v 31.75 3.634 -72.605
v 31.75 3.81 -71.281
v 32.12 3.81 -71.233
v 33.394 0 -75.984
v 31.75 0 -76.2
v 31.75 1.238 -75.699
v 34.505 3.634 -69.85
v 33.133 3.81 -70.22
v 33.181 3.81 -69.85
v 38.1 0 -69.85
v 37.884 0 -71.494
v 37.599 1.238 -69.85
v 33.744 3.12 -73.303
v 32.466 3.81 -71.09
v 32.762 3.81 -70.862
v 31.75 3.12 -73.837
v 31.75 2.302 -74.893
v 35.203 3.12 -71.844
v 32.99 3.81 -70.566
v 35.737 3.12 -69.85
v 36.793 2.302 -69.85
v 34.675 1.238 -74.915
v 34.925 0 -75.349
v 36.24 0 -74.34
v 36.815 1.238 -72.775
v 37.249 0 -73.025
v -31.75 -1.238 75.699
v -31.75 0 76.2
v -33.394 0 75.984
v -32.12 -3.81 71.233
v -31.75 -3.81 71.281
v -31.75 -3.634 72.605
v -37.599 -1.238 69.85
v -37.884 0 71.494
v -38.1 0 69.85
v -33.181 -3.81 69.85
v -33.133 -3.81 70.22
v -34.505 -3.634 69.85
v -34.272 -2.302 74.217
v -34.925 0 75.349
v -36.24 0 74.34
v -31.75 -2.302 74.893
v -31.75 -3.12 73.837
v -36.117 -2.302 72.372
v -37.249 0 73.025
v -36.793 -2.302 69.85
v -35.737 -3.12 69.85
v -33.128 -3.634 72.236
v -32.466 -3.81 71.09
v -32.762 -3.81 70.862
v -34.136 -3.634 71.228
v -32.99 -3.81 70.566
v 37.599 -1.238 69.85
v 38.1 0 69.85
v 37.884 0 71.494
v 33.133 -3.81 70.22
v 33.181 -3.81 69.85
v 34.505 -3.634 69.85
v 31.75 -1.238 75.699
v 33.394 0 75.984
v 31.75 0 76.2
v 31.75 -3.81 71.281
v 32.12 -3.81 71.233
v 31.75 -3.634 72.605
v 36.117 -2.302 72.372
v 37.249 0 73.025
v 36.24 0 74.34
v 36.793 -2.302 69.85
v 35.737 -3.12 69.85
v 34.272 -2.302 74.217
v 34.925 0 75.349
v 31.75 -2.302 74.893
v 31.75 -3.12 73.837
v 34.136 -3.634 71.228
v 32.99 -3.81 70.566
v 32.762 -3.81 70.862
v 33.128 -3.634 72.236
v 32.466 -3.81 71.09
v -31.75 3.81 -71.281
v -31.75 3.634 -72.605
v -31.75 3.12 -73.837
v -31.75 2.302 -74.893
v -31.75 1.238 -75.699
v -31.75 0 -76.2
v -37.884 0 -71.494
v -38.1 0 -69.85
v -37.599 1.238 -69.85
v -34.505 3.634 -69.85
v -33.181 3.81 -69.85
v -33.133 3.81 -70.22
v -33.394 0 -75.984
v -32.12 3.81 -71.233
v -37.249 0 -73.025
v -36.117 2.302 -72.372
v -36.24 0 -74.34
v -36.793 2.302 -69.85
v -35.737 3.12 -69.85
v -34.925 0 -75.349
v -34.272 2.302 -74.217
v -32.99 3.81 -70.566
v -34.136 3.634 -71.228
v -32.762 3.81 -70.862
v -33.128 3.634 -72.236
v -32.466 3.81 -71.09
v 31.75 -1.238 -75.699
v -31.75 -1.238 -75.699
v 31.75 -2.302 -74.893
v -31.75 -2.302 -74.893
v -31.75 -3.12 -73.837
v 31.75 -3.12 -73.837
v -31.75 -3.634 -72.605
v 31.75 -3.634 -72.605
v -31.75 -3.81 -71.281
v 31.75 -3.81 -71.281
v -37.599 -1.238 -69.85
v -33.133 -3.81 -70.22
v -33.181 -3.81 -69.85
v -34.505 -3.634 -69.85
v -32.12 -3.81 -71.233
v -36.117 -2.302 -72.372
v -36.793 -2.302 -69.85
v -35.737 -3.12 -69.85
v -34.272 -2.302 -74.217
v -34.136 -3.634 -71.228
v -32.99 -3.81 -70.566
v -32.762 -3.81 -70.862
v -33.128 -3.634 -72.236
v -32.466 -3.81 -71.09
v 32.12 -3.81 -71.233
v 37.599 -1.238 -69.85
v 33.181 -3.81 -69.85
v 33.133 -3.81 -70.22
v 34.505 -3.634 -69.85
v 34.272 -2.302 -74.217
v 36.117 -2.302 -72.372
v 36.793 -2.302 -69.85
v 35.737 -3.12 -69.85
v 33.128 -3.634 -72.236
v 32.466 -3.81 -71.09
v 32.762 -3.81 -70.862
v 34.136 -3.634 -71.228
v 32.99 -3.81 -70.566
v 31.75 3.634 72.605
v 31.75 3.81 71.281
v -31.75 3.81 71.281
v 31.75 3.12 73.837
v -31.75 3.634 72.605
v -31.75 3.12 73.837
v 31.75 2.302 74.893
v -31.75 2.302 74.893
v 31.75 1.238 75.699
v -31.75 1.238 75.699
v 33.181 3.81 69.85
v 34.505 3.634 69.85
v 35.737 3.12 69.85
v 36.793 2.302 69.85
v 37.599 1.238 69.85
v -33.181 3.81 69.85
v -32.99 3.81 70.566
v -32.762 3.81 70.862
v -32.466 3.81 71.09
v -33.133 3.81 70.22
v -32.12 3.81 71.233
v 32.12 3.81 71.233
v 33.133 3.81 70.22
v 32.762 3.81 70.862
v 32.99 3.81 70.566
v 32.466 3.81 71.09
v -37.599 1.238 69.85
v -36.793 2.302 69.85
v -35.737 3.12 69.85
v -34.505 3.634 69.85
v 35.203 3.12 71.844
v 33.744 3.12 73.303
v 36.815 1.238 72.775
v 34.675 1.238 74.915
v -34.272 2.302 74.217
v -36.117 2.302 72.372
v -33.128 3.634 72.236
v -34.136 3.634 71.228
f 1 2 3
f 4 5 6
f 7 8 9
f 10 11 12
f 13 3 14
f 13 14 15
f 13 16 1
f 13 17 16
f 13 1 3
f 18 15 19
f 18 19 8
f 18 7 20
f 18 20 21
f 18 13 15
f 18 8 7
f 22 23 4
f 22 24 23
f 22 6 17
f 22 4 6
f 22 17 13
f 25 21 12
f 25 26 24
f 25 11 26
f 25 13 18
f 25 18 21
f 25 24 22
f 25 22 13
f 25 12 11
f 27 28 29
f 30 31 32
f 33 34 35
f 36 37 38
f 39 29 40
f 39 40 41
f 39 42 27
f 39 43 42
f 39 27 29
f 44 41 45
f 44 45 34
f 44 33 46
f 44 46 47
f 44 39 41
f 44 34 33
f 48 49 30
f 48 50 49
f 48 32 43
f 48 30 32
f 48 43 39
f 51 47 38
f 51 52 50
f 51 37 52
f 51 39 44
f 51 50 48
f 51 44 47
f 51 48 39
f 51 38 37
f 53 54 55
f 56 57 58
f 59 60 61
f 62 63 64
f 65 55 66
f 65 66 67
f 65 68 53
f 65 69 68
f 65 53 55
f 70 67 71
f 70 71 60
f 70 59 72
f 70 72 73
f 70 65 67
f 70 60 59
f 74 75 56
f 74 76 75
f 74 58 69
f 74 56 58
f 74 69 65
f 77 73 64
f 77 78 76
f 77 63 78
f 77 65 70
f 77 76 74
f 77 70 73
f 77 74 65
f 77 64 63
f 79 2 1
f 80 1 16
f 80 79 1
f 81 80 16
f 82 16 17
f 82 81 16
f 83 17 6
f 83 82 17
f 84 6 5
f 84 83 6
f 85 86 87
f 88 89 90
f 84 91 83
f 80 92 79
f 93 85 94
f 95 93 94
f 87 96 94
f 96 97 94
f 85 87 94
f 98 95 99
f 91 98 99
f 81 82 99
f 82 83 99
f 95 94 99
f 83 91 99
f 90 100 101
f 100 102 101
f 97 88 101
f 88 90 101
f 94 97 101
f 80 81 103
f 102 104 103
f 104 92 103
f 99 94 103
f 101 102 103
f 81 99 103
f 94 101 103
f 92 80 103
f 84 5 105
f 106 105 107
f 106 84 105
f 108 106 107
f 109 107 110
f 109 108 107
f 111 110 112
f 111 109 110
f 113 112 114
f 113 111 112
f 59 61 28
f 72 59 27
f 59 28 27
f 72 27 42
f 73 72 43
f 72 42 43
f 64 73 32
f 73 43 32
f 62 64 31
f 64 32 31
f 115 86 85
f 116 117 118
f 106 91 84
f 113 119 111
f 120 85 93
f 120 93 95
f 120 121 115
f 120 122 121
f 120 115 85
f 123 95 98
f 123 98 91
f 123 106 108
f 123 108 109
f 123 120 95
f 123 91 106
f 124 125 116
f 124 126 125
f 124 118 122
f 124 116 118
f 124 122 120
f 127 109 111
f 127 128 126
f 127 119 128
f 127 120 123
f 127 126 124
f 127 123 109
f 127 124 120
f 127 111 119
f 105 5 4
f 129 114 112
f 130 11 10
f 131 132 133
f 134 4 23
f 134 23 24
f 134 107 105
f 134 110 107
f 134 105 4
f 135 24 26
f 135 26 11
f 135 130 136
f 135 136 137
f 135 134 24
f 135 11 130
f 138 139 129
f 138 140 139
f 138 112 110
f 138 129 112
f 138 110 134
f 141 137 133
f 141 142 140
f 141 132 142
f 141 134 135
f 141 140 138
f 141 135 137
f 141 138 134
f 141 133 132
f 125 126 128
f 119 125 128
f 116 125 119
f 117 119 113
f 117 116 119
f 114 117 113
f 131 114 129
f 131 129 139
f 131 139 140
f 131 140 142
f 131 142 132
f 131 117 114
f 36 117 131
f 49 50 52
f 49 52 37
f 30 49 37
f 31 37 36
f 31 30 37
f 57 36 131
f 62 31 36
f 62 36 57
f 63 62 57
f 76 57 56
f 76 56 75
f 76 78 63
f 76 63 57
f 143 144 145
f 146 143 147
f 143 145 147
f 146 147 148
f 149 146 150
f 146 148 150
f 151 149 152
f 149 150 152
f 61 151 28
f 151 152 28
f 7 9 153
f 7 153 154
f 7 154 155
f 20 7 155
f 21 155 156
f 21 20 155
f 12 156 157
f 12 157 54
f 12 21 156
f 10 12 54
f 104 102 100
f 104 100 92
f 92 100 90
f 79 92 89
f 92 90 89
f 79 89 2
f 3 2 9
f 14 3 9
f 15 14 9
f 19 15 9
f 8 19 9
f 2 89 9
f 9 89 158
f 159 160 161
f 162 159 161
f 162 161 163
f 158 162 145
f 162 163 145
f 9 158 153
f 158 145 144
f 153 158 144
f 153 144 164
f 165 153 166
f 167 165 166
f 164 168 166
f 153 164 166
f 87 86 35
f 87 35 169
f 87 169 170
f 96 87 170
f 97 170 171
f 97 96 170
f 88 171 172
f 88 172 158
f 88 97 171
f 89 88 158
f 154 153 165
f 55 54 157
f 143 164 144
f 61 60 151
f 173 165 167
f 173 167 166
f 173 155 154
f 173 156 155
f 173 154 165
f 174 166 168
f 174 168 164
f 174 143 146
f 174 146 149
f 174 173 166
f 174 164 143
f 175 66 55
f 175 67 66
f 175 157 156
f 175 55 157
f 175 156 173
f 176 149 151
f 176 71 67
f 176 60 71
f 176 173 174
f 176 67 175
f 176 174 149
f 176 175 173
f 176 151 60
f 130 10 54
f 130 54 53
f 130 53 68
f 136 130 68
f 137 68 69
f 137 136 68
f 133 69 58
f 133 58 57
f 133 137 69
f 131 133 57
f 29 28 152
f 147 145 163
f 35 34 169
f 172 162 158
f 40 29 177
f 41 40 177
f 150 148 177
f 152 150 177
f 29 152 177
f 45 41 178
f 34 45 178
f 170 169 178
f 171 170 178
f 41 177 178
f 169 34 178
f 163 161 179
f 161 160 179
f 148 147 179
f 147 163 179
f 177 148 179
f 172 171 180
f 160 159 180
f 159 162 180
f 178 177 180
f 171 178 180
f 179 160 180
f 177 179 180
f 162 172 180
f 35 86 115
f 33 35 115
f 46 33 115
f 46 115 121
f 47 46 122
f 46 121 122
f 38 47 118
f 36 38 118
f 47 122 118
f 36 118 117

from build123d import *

# Parameters (mm, degrees)
F1_DEPTH     = 3.81
F2_T1_DEPTH  = 139.7
F2_T3_DEPTH  = 63.5
F2_T6_ANGLE  = 90
F2_T8_ANGLE  = 90
F2_T10_ANGLE = 90
F2_T12_ANGLE = 90
F3_DEPTH     = 3.81
F4_T1_DEPTH  = 139.7
F4_T3_DEPTH  = 63.5
F4_T6_ANGLE  = 90
F4_T8_ANGLE  = 90
F4_T10_ANGLE = 90
F4_T12_ANGLE = 90


# Not quite as in the source:
# - a fillet or chamfer that OpenCascade refuses, or shapes differently, is made with other operations: its cross-section is extruded or revolved along the edge and cut away or added
# - the program builds the solid bodies; features that only make, move or delete a surface that nothing else refers to are left out


with BuildPart() as f1:
    # F0 (on Front) → F1 (new body)
    with BuildSketch(Plane.XZ):
        with BuildLine():
            Line((-31.75, -76.2), (31.75, -76.2))
            ThreePointArc((31.75, -76.2), (36.2401280605, -74.3401280605), (38.1, -69.85))
            Line((38.1, -69.85), (38.1, 69.85))
            ThreePointArc((38.1, 69.85), (36.2401280605, 74.3401280605), (31.75, 76.2))
            Line((31.75, 76.2), (-31.75, 76.2))
            ThreePointArc((-31.75, 76.2), (-36.2401280605, 74.3401280605), (-38.1, 69.85))
            Line((-38.1, 69.85), (-38.1, -69.85))
            ThreePointArc((-38.1, -69.85), (-36.2401280605, -74.3401280605), (-31.75, -76.2))
        make_face()
    extrude(amount=F1_DEPTH)

    # F2: fillet of radius 5.08 on 1 edges, made by hand

    # F2_s2 → F2_t1 (cut)
    with BuildSketch(Plane.XY.offset(-69.85)):
        with BuildLine():
            ThreePointArc((38.1, 0), (36.2921631237, -2.7460926284), (33.1813111503, -3.81))
            Line((33.1813111503, -3.81), (38.1, -3.81))
            Line((38.1, -3.81), (38.1, 0))
        make_face()
        with BuildLine():
            ThreePointArc((-38.1, 0), (-36.2921631237, -2.7460926284), (-33.1813111503, -3.81))
            Line((-33.1813111503, -3.81), (-38.1, -3.81))
            Line((-38.1, -3.81), (-38.1, 0))
        make_face()
    extrude(amount=F2_T1_DEPTH, mode=Mode.SUBTRACT)

    # F2_s4 → F2_t3 (cut)
    with BuildSketch(Plane.YZ.offset(-31.75)):
        with BuildLine():
            ThreePointArc((0, 76.2), (-2.7460926284, 74.3921631237), (-3.81, 71.2813111503))
            Line((-3.81, 71.2813111503), (-3.81, 76.2))
            Line((-3.81, 76.2), (0, 76.2))
        make_face()
        with BuildLine():
            ThreePointArc((0, -76.2), (-2.7460926284, -74.3921631237), (-3.81, -71.2813111503))
            Line((-3.81, -71.2813111503), (-3.81, -76.2))
            Line((-3.81, -76.2), (0, -76.2))
        make_face()
    extrude(amount=F2_T3_DEPTH, mode=Mode.SUBTRACT)

    # F2_s5 → F2_t6 (revolve, cut)
    with BuildSketch(Plane.YZ.offset(31.75)):
        with BuildLine():
            ThreePointArc((0, -76.2), (-2.7460926284, -74.3921631237), (-3.81, -71.2813111503))
            Line((-3.81, -71.2813111503), (-3.81, -76.2))
            Line((-3.81, -76.2), (0, -76.2))
        make_face()
    revolve(axis=Axis((31.75, -3.81, -69.85), (0, -1, 0)), revolution_arc=F2_T6_ANGLE, mode=Mode.SUBTRACT)

    # F2_s7 → F2_t8 (revolve, cut)
    with BuildSketch(Plane.XY.offset(69.85)):
        with BuildLine():
            ThreePointArc((38.1, 0), (36.2921631237, -2.7460926284), (33.1813111503, -3.81))
            Line((33.1813111503, -3.81), (38.1, -3.81))
            Line((38.1, -3.81), (38.1, 0))
        make_face()
    revolve(axis=Axis((31.75, -3.81, 69.85), (0, -1, 0)), revolution_arc=F2_T8_ANGLE, mode=Mode.SUBTRACT)

    # F2_s9 → F2_t10 (revolve, cut)
    with BuildSketch(Plane.YZ.offset(-31.75)):
        with BuildLine():
            ThreePointArc((0, 76.2), (-2.7460926284, 74.3921631237), (-3.81, 71.2813111503))
            Line((-3.81, 71.2813111503), (-3.81, 76.2))
            Line((-3.81, 76.2), (0, 76.2))
        make_face()
    revolve(axis=Axis((-31.75, -3.81, 69.85), (0, -1, 0)), revolution_arc=F2_T10_ANGLE, mode=Mode.SUBTRACT)

    # F2_s11 → F2_t12 (revolve, cut)
    with BuildSketch(Plane.XY.offset(-69.85)):
        with BuildLine():
            ThreePointArc((-38.1, 0), (-36.2921631237, -2.7460926284), (-33.1813111503, -3.81))
            Line((-33.1813111503, -3.81), (-38.1, -3.81))
            Line((-38.1, -3.81), (-38.1, 0))
        make_face()
    revolve(axis=Axis((-31.75, -3.81, -69.85), (0, -1, 0)), revolution_arc=F2_T12_ANGLE, mode=Mode.SUBTRACT)

    # F3 (add): a face of the model
    f3_faces = [f1.faces().sort_by_distance(p)[0] for p in [
        (0, 0, 0),
    ]]
    extrude(f3_faces, amount=F3_DEPTH)

    # F4: fillet of radius 5.08 on 1 edges, made by hand

    # F4_s2 → F4_t1 (cut)
    with BuildSketch(Plane.XY.offset(-69.85)):
        with BuildLine():
            ThreePointArc((33.1813111503, 3.81), (36.2921631237, 2.7460926284), (38.1, 0))
            Line((38.1, 0), (38.1, 3.81))
            Line((38.1, 3.81), (33.1813111503, 3.81))
        make_face()
        with BuildLine():
            ThreePointArc((-38.1, 0), (-36.2921631237, 2.7460926284), (-33.1813111503, 3.81))
            Line((-33.1813111503, 3.81), (-38.1, 3.81))
            Line((-38.1, 3.81), (-38.1, 0))
        make_face()
    extrude(amount=F4_T1_DEPTH, mode=Mode.SUBTRACT)

    # F4_s4 → F4_t3 (cut)
    with BuildSketch(Plane.YZ.offset(-31.75)):
        with BuildLine():
            ThreePointArc((3.81, 71.2813111503), (2.7460926284, 74.3921631237), (0, 76.2))
            Line((0, 76.2), (3.81, 76.2))
            Line((3.81, 76.2), (3.81, 71.2813111503))
        make_face()
        with BuildLine():
            ThreePointArc((3.81, -71.2813111503), (2.7460926284, -74.3921631237), (0, -76.2))
            Line((0, -76.2), (3.81, -76.2))
            Line((3.81, -76.2), (3.81, -71.2813111503))
        make_face()
    extrude(amount=F4_T3_DEPTH, mode=Mode.SUBTRACT)

    # F4_s5 → F4_t6 (revolve, cut)
    with BuildSketch(Plane.YZ.offset(31.75)):
        with BuildLine():
            ThreePointArc((3.81, -71.2813111503), (2.7460926284, -74.3921631237), (0, -76.2))
            Line((0, -76.2), (3.81, -76.2))
            Line((3.81, -76.2), (3.81, -71.2813111503))
        make_face()
    revolve(axis=Axis((31.75, 3.81, -69.85), (0, -1, 0)), revolution_arc=F4_T6_ANGLE, mode=Mode.SUBTRACT)

    # F4_s7 → F4_t8 (revolve, cut)
    with BuildSketch(Plane.XY.offset(69.85)):
        with BuildLine():
            ThreePointArc((33.1813111503, 3.81), (36.2921631237, 2.7460926284), (38.1, 0))
            Line((38.1, 0), (38.1, 3.81))
            Line((38.1, 3.81), (33.1813111503, 3.81))
        make_face()
    revolve(axis=Axis((31.75, 3.81, 69.85), (0, -1, 0)), revolution_arc=F4_T8_ANGLE, mode=Mode.SUBTRACT)

    # F4_s9 → F4_t10 (revolve, cut)
    with BuildSketch(Plane.YZ.offset(-31.75)):
        with BuildLine():
            ThreePointArc((0, 76.2), (2.7460926284, 74.3921631237), (3.81, 71.2813111503))
            Line((3.81, 71.2813111503), (3.81, 76.2))
            Line((3.81, 76.2), (0, 76.2))
        make_face()
    revolve(axis=Axis((-31.75, 3.81, 69.85), (0, -1, 0)), revolution_arc=F4_T10_ANGLE, mode=Mode.SUBTRACT)

    # F4_s11 → F4_t12 (revolve, cut)
    with BuildSketch(Plane.XY.offset(-69.85)):
        with BuildLine():
            ThreePointArc((-38.1, 0), (-36.2921631237, 2.7460926284), (-33.1813111503, 3.81))
            Line((-33.1813111503, 3.81), (-38.1, 3.81))
            Line((-38.1, 3.81), (-38.1, 0))
        make_face()
    revolve(axis=Axis((-31.75, 3.81, -69.85), (0, -1, 0)), revolution_arc=F4_T12_ANGLE, mode=Mode.SUBTRACT)


solid = f1.part
